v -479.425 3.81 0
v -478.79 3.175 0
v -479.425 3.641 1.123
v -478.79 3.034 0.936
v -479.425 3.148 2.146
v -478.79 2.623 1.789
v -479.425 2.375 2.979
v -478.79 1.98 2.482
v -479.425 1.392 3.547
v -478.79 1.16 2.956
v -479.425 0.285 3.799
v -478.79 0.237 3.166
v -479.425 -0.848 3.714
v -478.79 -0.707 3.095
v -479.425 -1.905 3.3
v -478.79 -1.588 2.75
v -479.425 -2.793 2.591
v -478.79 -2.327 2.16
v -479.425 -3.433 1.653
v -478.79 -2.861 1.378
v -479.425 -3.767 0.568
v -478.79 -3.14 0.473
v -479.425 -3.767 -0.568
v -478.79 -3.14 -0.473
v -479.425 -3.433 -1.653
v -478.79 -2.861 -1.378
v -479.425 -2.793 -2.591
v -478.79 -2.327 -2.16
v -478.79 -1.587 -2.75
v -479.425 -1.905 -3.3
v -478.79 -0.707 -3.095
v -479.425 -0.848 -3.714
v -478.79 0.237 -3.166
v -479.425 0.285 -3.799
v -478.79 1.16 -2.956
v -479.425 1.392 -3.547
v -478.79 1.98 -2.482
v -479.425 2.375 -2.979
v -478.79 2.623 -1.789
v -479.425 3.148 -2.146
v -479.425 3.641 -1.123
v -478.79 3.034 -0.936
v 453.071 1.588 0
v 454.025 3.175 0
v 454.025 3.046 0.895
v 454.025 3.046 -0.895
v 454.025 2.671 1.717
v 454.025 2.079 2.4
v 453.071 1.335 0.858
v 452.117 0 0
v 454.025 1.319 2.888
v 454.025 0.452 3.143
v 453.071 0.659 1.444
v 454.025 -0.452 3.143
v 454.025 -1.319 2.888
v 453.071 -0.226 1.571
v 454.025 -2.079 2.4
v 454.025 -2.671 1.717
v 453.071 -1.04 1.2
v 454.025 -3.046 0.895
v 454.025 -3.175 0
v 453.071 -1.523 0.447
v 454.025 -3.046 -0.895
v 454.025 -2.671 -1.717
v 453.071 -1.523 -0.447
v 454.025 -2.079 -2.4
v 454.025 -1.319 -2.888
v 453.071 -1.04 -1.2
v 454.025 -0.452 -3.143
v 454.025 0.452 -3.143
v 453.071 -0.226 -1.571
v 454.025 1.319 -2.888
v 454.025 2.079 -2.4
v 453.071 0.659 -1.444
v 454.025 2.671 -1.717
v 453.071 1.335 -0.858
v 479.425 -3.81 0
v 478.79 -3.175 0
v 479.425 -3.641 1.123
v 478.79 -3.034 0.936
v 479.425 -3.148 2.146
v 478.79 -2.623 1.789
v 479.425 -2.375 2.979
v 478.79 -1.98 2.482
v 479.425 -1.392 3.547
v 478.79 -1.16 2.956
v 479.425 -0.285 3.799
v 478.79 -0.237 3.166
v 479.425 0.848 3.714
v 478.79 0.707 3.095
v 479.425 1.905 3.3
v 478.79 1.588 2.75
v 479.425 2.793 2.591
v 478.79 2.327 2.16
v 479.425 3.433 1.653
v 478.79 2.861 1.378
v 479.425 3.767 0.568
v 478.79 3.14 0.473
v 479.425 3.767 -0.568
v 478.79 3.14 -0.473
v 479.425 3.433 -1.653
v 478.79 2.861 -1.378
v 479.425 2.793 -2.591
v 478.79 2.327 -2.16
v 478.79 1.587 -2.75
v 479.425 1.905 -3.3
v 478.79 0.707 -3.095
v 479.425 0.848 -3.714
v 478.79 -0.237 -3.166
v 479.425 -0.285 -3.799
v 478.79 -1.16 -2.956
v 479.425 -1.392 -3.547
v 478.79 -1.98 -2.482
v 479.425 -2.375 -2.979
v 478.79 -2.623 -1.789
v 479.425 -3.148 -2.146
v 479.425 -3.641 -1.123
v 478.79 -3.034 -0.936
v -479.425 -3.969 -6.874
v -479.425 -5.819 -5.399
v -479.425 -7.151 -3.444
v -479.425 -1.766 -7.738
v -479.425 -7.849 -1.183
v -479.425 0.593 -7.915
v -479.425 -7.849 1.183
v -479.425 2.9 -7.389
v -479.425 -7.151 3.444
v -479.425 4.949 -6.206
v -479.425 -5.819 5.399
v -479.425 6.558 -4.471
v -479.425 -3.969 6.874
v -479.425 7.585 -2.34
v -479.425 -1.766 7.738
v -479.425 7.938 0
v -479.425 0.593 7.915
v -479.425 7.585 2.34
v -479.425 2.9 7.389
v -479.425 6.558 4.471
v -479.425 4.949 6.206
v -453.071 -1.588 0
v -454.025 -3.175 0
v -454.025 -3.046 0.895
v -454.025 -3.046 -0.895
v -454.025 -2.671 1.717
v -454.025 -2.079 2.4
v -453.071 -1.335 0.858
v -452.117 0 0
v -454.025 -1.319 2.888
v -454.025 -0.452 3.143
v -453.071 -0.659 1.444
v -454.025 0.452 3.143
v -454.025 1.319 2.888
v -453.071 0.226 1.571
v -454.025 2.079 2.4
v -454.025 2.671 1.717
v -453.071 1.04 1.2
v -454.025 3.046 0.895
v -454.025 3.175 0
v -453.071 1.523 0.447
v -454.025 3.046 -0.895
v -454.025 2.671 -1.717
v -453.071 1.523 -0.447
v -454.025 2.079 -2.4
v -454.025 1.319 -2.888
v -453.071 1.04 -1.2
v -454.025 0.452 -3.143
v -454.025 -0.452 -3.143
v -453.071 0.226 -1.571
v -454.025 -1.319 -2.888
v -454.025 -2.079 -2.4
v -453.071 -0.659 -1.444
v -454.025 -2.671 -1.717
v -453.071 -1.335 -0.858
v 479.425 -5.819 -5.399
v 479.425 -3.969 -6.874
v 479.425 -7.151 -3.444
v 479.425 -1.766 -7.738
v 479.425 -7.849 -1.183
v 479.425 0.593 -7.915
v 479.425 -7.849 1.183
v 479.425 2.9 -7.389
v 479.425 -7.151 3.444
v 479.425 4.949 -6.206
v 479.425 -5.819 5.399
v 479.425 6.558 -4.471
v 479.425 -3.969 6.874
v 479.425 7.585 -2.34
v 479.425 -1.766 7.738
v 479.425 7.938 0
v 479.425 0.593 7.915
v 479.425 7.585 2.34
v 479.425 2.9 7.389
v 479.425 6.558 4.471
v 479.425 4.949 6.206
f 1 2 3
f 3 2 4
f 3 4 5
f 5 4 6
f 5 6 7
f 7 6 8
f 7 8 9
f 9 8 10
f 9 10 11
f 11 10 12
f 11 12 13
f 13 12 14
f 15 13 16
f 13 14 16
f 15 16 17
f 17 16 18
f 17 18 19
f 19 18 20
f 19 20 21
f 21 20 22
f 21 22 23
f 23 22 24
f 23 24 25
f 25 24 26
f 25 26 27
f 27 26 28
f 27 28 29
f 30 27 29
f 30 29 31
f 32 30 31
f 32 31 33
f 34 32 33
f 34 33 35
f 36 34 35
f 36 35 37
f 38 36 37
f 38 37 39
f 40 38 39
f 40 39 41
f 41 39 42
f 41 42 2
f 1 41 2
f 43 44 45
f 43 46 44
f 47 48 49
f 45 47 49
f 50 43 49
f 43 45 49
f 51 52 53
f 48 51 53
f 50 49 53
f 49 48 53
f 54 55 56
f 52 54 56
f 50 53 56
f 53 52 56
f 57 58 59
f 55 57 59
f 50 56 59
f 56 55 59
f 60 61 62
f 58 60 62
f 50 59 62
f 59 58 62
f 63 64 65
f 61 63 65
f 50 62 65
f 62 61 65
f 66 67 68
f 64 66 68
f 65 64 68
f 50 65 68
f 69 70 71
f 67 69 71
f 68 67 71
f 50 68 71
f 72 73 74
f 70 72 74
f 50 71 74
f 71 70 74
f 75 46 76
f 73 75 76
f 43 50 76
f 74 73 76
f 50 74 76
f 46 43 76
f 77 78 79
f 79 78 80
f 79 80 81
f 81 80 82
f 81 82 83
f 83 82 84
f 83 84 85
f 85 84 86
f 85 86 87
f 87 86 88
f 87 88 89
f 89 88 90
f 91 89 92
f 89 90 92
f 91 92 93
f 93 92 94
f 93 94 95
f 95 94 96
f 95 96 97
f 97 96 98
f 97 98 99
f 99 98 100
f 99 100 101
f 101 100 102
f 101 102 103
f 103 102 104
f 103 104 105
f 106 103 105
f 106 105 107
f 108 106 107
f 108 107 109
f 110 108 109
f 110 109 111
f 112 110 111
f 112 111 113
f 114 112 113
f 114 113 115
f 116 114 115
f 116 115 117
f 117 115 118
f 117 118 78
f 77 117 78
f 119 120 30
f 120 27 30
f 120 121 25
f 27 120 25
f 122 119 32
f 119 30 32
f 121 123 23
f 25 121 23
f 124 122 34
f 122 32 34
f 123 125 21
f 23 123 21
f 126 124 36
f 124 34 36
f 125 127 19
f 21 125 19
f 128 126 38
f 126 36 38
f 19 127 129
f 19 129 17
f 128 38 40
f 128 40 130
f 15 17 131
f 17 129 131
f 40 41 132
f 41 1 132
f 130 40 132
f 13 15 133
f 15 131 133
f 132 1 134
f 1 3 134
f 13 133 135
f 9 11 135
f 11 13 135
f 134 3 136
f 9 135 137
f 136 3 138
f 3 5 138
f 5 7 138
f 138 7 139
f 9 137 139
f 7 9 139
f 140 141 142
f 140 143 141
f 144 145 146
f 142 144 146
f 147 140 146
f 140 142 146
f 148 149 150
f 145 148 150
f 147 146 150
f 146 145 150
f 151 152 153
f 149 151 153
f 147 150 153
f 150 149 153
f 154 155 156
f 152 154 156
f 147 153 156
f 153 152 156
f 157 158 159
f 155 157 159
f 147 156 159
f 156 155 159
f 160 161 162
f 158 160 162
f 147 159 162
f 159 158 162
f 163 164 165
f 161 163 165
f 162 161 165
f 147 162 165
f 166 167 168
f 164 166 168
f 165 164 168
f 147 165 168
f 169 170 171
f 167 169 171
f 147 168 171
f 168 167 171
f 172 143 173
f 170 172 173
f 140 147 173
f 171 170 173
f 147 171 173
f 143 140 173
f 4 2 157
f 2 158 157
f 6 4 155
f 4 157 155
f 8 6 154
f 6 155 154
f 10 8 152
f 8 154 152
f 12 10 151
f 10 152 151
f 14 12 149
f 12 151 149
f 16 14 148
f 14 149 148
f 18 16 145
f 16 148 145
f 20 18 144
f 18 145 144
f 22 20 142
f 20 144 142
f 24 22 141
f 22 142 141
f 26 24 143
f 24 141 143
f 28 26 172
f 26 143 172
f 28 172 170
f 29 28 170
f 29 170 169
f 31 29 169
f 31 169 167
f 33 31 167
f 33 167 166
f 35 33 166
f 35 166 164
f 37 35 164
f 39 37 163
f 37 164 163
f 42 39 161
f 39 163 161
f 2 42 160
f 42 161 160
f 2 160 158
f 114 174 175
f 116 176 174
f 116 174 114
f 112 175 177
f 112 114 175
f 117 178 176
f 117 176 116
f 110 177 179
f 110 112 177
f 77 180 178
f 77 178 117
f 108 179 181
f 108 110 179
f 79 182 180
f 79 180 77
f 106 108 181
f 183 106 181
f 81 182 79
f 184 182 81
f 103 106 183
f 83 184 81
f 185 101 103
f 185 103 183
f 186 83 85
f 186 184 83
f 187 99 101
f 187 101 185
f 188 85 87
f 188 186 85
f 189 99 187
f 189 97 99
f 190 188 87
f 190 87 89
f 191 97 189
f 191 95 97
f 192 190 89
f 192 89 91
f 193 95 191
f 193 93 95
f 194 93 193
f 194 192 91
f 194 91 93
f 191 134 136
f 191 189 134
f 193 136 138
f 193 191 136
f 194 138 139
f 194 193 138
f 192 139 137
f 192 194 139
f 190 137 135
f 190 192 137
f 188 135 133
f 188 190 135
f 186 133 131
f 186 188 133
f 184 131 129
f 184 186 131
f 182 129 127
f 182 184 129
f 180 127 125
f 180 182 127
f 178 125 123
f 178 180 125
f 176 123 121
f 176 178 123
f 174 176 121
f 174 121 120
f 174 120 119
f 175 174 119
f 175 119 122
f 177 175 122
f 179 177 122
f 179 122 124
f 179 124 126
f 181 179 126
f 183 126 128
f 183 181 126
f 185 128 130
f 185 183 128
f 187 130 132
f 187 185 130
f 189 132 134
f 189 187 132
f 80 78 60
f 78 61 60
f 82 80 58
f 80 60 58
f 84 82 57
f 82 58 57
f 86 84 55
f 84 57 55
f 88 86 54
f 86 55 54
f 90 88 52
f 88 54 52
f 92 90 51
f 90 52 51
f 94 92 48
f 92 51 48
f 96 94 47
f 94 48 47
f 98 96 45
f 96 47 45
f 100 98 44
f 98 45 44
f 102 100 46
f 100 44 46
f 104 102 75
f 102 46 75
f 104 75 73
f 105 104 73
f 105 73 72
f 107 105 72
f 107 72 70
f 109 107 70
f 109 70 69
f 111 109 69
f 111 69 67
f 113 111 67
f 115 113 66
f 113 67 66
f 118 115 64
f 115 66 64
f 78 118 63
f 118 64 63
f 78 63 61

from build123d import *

# Parameters (mm, degrees)
F0_R           = 7.9375
F1_DEPTH       = 479.425
F3_D           = 6.35
F3_DEPTH       = 25.4
F3_CSINK_D     = 7.62
F3_CSINK_ANGLE = 90
F3_TIP         = 1.9077324654
F5_D           = 6.35
F5_DEPTH       = 25.4
F5_CSINK_D     = 7.62
F5_CSINK_ANGLE = 90
F5_TIP         = 1.9077324654


with BuildPart() as f1:
    # F0 (on Right) → F1 (new body, symmetric)
    with BuildSketch(Plane.YZ):
        Circle(F0_R)
    extrude(amount=F1_DEPTH, both=True)

    # F3
    with Locations(Plane(origin=(-479.425, 0, 0), x_dir=(0, -1, 0), z_dir=(-1, 0, 0))):
        with Locations((0, 0)):
            CounterSinkHole(F3_D / 2, F3_CSINK_D / 2, depth=F3_DEPTH, counter_sink_angle=F3_CSINK_ANGLE)
            with Locations((0, 0, -(F3_DEPTH + F3_TIP / 2))):  # 118° drill point
                Cone(0, F3_D / 2, F3_TIP, mode=Mode.SUBTRACT)

    # F5
    with Locations(Plane.YZ.offset(479.425)):
        with Locations((0, 0)):
            CounterSinkHole(F5_D / 2, F5_CSINK_D / 2, depth=F5_DEPTH, counter_sink_angle=F5_CSINK_ANGLE)
            with Locations((0, 0, -(F5_DEPTH + F5_TIP / 2))):  # 118° drill point
                Cone(0, F5_D / 2, F5_TIP, mode=Mode.SUBTRACT)


solid = f1.part
